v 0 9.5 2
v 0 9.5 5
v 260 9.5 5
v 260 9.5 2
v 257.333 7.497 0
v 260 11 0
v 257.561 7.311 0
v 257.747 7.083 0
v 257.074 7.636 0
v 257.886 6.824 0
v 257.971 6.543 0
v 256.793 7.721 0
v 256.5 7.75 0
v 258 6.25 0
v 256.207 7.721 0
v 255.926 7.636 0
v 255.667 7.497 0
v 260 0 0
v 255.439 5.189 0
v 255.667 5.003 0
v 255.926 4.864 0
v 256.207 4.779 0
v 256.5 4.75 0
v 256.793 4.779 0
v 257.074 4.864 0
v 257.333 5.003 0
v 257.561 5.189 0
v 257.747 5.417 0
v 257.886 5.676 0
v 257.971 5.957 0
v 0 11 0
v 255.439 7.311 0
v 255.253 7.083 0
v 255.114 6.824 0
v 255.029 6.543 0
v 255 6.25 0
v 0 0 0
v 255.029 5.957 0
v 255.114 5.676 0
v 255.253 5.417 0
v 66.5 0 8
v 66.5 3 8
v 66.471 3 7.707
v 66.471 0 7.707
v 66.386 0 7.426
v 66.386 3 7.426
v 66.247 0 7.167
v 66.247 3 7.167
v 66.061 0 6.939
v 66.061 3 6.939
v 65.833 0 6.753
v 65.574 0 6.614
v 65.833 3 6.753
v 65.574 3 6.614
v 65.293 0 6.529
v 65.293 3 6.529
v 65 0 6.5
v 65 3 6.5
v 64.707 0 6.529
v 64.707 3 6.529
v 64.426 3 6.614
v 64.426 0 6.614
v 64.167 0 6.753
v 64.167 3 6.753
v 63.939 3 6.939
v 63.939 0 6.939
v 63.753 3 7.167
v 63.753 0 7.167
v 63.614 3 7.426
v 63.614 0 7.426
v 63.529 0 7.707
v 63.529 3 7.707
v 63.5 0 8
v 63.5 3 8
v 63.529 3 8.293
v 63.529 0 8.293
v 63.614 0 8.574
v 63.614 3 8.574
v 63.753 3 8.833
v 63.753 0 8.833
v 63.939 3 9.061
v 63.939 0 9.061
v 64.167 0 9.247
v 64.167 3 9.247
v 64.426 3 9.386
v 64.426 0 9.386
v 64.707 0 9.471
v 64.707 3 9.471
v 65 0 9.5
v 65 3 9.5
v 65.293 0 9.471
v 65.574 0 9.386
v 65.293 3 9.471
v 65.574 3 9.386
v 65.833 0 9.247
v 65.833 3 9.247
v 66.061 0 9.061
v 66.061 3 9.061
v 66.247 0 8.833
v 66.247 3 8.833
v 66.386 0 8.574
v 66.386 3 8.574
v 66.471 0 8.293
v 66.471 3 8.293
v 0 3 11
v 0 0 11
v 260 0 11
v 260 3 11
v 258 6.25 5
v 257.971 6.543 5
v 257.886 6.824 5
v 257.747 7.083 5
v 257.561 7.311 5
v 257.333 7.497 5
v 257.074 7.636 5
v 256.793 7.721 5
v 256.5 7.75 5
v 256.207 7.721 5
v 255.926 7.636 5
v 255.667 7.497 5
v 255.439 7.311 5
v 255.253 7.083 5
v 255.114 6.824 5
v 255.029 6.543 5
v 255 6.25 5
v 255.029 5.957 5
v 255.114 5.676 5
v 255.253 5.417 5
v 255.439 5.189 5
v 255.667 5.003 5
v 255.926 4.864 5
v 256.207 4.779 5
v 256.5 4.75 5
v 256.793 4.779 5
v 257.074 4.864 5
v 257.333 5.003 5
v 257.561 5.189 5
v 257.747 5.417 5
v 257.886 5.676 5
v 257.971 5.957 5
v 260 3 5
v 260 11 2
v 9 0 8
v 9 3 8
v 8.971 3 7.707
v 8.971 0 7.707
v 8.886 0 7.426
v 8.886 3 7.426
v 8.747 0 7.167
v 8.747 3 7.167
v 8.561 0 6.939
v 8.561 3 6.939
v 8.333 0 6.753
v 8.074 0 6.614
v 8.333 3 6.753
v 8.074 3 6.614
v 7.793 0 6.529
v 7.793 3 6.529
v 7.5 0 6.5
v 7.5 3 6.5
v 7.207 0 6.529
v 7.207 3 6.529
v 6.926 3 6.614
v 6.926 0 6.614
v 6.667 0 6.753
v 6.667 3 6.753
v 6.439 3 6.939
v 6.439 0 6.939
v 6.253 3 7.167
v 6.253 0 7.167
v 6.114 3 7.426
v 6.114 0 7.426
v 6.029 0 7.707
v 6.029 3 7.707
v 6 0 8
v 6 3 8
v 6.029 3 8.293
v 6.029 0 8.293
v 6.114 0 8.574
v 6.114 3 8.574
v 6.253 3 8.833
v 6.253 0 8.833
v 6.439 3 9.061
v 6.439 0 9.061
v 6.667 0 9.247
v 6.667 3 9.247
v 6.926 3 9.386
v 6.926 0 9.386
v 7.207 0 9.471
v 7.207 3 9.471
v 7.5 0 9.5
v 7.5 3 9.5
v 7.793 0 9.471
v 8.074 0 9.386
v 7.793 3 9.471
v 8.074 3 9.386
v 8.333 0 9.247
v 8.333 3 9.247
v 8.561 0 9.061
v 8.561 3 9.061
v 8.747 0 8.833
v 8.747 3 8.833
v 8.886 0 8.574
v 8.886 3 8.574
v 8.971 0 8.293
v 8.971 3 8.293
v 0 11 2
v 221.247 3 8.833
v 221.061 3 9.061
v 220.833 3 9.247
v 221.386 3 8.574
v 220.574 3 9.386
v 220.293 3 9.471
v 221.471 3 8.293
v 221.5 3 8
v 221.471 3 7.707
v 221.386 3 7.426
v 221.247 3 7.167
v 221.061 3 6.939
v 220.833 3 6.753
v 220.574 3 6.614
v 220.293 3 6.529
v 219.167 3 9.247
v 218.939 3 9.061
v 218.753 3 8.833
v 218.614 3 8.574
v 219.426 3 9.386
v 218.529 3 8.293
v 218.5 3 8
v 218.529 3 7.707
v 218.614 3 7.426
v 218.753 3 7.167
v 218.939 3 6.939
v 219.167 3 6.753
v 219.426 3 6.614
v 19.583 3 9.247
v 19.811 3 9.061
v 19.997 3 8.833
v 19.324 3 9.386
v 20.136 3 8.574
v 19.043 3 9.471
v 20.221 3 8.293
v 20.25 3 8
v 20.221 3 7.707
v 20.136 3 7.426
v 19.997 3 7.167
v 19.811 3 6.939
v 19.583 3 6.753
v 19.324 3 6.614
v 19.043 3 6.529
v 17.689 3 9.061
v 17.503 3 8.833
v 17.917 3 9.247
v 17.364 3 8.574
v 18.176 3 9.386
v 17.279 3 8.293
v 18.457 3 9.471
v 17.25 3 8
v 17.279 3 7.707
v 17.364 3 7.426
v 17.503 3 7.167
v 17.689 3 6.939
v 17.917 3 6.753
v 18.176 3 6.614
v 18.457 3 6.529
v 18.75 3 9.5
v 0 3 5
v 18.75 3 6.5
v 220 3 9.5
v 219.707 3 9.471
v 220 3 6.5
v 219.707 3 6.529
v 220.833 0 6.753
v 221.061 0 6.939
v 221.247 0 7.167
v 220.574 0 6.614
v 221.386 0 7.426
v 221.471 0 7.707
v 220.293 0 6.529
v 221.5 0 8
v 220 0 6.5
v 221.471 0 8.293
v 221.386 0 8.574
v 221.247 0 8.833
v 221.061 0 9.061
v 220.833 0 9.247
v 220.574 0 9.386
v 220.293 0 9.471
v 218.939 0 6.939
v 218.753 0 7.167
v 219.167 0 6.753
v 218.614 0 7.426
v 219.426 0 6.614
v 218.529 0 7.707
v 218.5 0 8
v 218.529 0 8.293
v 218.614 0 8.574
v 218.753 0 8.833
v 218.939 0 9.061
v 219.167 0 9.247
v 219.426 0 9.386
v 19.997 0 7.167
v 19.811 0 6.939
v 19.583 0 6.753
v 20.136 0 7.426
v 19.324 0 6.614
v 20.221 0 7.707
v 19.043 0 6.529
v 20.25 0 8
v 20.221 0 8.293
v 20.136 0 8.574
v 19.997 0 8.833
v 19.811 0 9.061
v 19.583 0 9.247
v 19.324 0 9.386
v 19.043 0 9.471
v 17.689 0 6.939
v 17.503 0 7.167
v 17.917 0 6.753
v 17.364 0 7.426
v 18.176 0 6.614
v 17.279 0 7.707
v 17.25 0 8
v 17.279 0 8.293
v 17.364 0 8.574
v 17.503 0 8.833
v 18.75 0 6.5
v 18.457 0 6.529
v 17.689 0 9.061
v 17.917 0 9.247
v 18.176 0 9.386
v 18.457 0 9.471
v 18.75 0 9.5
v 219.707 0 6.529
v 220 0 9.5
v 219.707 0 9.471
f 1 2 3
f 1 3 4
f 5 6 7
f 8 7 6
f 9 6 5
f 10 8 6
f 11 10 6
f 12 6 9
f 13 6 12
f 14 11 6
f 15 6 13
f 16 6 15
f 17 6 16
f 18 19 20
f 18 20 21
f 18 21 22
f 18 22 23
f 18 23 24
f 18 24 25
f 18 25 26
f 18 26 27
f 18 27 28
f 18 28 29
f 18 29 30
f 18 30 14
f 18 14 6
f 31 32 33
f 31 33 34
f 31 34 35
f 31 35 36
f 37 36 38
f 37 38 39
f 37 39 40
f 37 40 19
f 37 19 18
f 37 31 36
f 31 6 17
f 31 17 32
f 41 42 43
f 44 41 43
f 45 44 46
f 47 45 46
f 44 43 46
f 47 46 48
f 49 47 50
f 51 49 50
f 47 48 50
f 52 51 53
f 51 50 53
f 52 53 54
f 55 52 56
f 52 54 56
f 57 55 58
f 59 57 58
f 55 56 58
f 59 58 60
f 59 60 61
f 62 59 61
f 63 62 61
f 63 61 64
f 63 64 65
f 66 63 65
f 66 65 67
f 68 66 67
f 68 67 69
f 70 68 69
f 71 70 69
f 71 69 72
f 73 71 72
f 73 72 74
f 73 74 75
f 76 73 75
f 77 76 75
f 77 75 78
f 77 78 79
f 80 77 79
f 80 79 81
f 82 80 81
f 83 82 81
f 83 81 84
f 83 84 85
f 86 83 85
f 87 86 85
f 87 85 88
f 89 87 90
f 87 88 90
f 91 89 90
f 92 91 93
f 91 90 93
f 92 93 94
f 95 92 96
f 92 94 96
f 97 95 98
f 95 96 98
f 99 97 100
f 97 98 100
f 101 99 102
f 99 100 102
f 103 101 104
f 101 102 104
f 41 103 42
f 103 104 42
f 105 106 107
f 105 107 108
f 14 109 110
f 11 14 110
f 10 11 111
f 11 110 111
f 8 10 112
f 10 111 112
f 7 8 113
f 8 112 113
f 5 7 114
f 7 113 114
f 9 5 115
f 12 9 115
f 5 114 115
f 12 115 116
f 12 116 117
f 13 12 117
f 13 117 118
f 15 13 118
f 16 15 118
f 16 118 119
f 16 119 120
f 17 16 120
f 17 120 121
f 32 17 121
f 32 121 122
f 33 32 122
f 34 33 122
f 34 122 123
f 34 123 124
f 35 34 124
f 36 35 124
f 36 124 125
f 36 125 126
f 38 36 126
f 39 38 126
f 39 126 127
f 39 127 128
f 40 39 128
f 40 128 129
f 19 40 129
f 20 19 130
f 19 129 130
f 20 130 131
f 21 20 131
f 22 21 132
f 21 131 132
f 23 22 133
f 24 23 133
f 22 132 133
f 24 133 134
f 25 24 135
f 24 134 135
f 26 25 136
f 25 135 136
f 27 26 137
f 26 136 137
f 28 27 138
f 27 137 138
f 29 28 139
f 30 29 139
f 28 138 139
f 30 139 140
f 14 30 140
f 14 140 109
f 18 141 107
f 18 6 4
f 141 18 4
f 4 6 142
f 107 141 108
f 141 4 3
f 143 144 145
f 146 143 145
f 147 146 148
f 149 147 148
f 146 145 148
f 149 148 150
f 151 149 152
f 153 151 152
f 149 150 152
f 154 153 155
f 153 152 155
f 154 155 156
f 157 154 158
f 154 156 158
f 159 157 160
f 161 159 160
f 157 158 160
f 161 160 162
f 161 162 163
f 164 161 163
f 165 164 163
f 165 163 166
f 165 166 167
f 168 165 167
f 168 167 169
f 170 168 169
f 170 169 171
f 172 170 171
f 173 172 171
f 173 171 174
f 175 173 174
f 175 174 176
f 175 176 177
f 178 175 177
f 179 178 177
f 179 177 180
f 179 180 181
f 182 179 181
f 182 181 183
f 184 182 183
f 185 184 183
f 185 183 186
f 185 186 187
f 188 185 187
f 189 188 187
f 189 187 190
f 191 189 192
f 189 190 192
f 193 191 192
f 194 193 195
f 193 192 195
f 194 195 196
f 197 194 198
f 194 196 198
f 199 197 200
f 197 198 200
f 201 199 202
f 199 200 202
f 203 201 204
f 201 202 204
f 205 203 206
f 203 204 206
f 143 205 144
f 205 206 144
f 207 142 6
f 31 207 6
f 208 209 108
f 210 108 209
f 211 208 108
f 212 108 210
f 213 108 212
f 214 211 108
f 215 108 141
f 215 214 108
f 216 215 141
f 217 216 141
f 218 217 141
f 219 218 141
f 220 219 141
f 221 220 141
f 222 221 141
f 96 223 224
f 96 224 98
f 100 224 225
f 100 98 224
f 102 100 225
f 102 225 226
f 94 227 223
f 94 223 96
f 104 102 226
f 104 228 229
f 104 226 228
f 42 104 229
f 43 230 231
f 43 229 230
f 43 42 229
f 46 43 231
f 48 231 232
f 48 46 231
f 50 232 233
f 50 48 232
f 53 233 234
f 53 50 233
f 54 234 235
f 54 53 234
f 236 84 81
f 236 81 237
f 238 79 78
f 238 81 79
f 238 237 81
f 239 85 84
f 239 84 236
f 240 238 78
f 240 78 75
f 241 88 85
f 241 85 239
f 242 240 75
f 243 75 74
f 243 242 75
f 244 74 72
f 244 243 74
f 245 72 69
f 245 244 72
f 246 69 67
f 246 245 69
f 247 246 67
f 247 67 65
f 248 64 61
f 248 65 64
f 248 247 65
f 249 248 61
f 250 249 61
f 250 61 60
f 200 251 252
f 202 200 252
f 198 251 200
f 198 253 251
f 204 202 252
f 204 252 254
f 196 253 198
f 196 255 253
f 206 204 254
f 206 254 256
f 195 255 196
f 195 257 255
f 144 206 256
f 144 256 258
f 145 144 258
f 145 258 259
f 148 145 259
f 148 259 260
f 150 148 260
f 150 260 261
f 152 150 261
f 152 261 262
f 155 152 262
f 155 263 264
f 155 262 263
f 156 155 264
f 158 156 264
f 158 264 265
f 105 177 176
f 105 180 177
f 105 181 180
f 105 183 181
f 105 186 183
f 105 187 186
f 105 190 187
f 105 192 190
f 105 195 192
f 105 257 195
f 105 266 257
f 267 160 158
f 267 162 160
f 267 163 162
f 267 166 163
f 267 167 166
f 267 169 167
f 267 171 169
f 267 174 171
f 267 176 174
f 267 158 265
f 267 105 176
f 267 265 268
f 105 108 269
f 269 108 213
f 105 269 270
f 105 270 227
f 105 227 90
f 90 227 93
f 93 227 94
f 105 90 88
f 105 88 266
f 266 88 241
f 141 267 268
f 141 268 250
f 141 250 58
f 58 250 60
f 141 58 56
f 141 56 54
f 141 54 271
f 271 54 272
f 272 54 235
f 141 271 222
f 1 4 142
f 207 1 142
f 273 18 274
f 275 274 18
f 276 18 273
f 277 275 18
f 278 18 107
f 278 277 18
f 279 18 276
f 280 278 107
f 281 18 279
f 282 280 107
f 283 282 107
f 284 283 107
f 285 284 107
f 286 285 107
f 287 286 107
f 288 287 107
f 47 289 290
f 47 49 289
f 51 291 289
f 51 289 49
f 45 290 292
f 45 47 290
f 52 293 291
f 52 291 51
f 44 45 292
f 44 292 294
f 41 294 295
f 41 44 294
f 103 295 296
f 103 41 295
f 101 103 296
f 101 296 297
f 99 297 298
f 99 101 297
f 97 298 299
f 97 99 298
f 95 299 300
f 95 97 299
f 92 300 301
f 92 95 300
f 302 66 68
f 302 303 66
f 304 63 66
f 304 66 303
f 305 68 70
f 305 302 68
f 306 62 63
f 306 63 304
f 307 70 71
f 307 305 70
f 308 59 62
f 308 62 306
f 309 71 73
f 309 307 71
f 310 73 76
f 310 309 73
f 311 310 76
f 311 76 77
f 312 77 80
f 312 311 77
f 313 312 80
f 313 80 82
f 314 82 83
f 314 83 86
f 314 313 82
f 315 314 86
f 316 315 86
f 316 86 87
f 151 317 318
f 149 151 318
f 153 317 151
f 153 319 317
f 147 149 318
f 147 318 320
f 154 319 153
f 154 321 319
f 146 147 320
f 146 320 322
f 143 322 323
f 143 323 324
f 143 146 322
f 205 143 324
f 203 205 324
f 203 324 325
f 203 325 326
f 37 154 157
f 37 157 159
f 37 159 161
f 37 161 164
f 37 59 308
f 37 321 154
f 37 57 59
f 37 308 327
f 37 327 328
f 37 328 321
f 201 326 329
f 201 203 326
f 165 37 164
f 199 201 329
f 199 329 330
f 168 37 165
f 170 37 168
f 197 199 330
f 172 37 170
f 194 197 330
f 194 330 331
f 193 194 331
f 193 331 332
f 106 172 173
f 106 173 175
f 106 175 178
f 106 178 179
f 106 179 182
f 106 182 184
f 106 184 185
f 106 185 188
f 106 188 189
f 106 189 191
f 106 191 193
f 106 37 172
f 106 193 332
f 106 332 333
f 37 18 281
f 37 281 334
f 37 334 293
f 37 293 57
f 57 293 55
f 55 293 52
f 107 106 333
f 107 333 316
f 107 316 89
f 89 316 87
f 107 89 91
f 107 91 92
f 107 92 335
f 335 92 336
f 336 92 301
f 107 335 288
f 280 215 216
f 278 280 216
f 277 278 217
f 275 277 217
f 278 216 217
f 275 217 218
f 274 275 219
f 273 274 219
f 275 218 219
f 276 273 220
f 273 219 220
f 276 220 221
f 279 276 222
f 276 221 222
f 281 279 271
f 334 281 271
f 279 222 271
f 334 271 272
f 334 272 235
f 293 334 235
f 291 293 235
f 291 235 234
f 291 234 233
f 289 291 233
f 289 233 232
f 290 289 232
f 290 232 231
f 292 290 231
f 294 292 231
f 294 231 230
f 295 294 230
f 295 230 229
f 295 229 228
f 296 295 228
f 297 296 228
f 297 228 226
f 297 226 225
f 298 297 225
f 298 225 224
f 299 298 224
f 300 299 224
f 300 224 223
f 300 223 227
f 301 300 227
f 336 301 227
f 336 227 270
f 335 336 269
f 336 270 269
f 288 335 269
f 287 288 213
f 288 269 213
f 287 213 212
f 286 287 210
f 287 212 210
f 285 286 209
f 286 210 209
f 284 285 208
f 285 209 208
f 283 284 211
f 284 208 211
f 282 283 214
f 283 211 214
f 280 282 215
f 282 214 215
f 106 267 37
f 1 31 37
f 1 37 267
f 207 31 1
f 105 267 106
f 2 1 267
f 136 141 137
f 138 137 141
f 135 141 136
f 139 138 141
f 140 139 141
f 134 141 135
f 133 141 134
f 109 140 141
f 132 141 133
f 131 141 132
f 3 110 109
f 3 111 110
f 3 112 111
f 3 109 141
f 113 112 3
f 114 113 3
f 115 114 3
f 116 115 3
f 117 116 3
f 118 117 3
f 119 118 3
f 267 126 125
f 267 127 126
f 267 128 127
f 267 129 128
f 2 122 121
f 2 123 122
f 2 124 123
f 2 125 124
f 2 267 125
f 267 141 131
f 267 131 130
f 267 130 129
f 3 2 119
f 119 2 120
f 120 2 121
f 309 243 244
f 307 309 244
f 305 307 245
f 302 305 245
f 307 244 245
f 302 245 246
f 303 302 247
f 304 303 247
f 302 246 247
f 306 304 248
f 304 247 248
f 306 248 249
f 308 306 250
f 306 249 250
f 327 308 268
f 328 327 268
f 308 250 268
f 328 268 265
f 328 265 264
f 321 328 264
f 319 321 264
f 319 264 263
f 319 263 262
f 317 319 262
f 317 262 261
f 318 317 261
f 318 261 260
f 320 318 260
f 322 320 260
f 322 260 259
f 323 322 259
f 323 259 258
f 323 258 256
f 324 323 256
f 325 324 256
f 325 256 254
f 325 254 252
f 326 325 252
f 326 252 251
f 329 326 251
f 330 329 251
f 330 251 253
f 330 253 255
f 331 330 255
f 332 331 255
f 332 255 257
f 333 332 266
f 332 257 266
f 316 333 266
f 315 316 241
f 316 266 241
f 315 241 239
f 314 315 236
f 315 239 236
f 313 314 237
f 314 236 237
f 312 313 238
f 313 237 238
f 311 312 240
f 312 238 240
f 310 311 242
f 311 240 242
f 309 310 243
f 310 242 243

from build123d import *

# Parameters (mm, degrees)
EXTRUDE_1_DEPTH     = 260
SKETCH_2_R          = 1.5
CUT_EXTRUDE_1_DEPTH = 6
SKETCH_3_R          = 1.5
CUT_EXTRUDE_2_DEPTH = 4
SKETCH_5_R          = 1.5
CUT_EXTRUDE_4_DEPTH = 4


with BuildPart() as part:
    # Эскиз1 → Бобышка-Вытянуть1 (new body)
    with BuildSketch(Plane(origin=(0, 0, 0), x_dir=(0, 0, -1), z_dir=(1, 0, 0))):
        Polygon((0, 0), (-11, 0), (-11, 3), (-5, 3), (-5, 9.5), (-2, 9.5), (-2, 11), (0, 11), align=None)
    extrude(amount=EXTRUDE_1_DEPTH)

    # Эскиз2 → Вырез-Вытянуть1 (cut, through all)
    with BuildSketch(Plane.XY.offset(5)):
        with Locations((256.5, 6.25)):
            Circle(SKETCH_2_R)
    extrude(amount=-CUT_EXTRUDE_1_DEPTH, mode=Mode.SUBTRACT)

    # Эскиз3 → Вырез-Вытянуть2 (cut, through all)
    with BuildSketch(Plane(origin=(0, 3, 0), x_dir=(1, 0, 0), z_dir=(0, 1, 0))):
        with Locations((7.5, -8)):
            Circle(SKETCH_3_R)
        with Locations((18.75, -8)):
            Circle(SKETCH_3_R)
    extrude(amount=-CUT_EXTRUDE_2_DEPTH, mode=Mode.SUBTRACT)

    # Эскиз5 → Вырез-Вытянуть4 (cut, through all)
    with BuildSketch(Plane(origin=(0, 3, 0), x_dir=(1, 0, 0), z_dir=(0, 1, 0))):
        with Locations((65, -8)):
            Circle(SKETCH_5_R)
        with Locations((220, -8)):
            Circle(SKETCH_5_R)
    extrude(amount=-CUT_EXTRUDE_4_DEPTH, mode=Mode.SUBTRACT)


solid = part.part
